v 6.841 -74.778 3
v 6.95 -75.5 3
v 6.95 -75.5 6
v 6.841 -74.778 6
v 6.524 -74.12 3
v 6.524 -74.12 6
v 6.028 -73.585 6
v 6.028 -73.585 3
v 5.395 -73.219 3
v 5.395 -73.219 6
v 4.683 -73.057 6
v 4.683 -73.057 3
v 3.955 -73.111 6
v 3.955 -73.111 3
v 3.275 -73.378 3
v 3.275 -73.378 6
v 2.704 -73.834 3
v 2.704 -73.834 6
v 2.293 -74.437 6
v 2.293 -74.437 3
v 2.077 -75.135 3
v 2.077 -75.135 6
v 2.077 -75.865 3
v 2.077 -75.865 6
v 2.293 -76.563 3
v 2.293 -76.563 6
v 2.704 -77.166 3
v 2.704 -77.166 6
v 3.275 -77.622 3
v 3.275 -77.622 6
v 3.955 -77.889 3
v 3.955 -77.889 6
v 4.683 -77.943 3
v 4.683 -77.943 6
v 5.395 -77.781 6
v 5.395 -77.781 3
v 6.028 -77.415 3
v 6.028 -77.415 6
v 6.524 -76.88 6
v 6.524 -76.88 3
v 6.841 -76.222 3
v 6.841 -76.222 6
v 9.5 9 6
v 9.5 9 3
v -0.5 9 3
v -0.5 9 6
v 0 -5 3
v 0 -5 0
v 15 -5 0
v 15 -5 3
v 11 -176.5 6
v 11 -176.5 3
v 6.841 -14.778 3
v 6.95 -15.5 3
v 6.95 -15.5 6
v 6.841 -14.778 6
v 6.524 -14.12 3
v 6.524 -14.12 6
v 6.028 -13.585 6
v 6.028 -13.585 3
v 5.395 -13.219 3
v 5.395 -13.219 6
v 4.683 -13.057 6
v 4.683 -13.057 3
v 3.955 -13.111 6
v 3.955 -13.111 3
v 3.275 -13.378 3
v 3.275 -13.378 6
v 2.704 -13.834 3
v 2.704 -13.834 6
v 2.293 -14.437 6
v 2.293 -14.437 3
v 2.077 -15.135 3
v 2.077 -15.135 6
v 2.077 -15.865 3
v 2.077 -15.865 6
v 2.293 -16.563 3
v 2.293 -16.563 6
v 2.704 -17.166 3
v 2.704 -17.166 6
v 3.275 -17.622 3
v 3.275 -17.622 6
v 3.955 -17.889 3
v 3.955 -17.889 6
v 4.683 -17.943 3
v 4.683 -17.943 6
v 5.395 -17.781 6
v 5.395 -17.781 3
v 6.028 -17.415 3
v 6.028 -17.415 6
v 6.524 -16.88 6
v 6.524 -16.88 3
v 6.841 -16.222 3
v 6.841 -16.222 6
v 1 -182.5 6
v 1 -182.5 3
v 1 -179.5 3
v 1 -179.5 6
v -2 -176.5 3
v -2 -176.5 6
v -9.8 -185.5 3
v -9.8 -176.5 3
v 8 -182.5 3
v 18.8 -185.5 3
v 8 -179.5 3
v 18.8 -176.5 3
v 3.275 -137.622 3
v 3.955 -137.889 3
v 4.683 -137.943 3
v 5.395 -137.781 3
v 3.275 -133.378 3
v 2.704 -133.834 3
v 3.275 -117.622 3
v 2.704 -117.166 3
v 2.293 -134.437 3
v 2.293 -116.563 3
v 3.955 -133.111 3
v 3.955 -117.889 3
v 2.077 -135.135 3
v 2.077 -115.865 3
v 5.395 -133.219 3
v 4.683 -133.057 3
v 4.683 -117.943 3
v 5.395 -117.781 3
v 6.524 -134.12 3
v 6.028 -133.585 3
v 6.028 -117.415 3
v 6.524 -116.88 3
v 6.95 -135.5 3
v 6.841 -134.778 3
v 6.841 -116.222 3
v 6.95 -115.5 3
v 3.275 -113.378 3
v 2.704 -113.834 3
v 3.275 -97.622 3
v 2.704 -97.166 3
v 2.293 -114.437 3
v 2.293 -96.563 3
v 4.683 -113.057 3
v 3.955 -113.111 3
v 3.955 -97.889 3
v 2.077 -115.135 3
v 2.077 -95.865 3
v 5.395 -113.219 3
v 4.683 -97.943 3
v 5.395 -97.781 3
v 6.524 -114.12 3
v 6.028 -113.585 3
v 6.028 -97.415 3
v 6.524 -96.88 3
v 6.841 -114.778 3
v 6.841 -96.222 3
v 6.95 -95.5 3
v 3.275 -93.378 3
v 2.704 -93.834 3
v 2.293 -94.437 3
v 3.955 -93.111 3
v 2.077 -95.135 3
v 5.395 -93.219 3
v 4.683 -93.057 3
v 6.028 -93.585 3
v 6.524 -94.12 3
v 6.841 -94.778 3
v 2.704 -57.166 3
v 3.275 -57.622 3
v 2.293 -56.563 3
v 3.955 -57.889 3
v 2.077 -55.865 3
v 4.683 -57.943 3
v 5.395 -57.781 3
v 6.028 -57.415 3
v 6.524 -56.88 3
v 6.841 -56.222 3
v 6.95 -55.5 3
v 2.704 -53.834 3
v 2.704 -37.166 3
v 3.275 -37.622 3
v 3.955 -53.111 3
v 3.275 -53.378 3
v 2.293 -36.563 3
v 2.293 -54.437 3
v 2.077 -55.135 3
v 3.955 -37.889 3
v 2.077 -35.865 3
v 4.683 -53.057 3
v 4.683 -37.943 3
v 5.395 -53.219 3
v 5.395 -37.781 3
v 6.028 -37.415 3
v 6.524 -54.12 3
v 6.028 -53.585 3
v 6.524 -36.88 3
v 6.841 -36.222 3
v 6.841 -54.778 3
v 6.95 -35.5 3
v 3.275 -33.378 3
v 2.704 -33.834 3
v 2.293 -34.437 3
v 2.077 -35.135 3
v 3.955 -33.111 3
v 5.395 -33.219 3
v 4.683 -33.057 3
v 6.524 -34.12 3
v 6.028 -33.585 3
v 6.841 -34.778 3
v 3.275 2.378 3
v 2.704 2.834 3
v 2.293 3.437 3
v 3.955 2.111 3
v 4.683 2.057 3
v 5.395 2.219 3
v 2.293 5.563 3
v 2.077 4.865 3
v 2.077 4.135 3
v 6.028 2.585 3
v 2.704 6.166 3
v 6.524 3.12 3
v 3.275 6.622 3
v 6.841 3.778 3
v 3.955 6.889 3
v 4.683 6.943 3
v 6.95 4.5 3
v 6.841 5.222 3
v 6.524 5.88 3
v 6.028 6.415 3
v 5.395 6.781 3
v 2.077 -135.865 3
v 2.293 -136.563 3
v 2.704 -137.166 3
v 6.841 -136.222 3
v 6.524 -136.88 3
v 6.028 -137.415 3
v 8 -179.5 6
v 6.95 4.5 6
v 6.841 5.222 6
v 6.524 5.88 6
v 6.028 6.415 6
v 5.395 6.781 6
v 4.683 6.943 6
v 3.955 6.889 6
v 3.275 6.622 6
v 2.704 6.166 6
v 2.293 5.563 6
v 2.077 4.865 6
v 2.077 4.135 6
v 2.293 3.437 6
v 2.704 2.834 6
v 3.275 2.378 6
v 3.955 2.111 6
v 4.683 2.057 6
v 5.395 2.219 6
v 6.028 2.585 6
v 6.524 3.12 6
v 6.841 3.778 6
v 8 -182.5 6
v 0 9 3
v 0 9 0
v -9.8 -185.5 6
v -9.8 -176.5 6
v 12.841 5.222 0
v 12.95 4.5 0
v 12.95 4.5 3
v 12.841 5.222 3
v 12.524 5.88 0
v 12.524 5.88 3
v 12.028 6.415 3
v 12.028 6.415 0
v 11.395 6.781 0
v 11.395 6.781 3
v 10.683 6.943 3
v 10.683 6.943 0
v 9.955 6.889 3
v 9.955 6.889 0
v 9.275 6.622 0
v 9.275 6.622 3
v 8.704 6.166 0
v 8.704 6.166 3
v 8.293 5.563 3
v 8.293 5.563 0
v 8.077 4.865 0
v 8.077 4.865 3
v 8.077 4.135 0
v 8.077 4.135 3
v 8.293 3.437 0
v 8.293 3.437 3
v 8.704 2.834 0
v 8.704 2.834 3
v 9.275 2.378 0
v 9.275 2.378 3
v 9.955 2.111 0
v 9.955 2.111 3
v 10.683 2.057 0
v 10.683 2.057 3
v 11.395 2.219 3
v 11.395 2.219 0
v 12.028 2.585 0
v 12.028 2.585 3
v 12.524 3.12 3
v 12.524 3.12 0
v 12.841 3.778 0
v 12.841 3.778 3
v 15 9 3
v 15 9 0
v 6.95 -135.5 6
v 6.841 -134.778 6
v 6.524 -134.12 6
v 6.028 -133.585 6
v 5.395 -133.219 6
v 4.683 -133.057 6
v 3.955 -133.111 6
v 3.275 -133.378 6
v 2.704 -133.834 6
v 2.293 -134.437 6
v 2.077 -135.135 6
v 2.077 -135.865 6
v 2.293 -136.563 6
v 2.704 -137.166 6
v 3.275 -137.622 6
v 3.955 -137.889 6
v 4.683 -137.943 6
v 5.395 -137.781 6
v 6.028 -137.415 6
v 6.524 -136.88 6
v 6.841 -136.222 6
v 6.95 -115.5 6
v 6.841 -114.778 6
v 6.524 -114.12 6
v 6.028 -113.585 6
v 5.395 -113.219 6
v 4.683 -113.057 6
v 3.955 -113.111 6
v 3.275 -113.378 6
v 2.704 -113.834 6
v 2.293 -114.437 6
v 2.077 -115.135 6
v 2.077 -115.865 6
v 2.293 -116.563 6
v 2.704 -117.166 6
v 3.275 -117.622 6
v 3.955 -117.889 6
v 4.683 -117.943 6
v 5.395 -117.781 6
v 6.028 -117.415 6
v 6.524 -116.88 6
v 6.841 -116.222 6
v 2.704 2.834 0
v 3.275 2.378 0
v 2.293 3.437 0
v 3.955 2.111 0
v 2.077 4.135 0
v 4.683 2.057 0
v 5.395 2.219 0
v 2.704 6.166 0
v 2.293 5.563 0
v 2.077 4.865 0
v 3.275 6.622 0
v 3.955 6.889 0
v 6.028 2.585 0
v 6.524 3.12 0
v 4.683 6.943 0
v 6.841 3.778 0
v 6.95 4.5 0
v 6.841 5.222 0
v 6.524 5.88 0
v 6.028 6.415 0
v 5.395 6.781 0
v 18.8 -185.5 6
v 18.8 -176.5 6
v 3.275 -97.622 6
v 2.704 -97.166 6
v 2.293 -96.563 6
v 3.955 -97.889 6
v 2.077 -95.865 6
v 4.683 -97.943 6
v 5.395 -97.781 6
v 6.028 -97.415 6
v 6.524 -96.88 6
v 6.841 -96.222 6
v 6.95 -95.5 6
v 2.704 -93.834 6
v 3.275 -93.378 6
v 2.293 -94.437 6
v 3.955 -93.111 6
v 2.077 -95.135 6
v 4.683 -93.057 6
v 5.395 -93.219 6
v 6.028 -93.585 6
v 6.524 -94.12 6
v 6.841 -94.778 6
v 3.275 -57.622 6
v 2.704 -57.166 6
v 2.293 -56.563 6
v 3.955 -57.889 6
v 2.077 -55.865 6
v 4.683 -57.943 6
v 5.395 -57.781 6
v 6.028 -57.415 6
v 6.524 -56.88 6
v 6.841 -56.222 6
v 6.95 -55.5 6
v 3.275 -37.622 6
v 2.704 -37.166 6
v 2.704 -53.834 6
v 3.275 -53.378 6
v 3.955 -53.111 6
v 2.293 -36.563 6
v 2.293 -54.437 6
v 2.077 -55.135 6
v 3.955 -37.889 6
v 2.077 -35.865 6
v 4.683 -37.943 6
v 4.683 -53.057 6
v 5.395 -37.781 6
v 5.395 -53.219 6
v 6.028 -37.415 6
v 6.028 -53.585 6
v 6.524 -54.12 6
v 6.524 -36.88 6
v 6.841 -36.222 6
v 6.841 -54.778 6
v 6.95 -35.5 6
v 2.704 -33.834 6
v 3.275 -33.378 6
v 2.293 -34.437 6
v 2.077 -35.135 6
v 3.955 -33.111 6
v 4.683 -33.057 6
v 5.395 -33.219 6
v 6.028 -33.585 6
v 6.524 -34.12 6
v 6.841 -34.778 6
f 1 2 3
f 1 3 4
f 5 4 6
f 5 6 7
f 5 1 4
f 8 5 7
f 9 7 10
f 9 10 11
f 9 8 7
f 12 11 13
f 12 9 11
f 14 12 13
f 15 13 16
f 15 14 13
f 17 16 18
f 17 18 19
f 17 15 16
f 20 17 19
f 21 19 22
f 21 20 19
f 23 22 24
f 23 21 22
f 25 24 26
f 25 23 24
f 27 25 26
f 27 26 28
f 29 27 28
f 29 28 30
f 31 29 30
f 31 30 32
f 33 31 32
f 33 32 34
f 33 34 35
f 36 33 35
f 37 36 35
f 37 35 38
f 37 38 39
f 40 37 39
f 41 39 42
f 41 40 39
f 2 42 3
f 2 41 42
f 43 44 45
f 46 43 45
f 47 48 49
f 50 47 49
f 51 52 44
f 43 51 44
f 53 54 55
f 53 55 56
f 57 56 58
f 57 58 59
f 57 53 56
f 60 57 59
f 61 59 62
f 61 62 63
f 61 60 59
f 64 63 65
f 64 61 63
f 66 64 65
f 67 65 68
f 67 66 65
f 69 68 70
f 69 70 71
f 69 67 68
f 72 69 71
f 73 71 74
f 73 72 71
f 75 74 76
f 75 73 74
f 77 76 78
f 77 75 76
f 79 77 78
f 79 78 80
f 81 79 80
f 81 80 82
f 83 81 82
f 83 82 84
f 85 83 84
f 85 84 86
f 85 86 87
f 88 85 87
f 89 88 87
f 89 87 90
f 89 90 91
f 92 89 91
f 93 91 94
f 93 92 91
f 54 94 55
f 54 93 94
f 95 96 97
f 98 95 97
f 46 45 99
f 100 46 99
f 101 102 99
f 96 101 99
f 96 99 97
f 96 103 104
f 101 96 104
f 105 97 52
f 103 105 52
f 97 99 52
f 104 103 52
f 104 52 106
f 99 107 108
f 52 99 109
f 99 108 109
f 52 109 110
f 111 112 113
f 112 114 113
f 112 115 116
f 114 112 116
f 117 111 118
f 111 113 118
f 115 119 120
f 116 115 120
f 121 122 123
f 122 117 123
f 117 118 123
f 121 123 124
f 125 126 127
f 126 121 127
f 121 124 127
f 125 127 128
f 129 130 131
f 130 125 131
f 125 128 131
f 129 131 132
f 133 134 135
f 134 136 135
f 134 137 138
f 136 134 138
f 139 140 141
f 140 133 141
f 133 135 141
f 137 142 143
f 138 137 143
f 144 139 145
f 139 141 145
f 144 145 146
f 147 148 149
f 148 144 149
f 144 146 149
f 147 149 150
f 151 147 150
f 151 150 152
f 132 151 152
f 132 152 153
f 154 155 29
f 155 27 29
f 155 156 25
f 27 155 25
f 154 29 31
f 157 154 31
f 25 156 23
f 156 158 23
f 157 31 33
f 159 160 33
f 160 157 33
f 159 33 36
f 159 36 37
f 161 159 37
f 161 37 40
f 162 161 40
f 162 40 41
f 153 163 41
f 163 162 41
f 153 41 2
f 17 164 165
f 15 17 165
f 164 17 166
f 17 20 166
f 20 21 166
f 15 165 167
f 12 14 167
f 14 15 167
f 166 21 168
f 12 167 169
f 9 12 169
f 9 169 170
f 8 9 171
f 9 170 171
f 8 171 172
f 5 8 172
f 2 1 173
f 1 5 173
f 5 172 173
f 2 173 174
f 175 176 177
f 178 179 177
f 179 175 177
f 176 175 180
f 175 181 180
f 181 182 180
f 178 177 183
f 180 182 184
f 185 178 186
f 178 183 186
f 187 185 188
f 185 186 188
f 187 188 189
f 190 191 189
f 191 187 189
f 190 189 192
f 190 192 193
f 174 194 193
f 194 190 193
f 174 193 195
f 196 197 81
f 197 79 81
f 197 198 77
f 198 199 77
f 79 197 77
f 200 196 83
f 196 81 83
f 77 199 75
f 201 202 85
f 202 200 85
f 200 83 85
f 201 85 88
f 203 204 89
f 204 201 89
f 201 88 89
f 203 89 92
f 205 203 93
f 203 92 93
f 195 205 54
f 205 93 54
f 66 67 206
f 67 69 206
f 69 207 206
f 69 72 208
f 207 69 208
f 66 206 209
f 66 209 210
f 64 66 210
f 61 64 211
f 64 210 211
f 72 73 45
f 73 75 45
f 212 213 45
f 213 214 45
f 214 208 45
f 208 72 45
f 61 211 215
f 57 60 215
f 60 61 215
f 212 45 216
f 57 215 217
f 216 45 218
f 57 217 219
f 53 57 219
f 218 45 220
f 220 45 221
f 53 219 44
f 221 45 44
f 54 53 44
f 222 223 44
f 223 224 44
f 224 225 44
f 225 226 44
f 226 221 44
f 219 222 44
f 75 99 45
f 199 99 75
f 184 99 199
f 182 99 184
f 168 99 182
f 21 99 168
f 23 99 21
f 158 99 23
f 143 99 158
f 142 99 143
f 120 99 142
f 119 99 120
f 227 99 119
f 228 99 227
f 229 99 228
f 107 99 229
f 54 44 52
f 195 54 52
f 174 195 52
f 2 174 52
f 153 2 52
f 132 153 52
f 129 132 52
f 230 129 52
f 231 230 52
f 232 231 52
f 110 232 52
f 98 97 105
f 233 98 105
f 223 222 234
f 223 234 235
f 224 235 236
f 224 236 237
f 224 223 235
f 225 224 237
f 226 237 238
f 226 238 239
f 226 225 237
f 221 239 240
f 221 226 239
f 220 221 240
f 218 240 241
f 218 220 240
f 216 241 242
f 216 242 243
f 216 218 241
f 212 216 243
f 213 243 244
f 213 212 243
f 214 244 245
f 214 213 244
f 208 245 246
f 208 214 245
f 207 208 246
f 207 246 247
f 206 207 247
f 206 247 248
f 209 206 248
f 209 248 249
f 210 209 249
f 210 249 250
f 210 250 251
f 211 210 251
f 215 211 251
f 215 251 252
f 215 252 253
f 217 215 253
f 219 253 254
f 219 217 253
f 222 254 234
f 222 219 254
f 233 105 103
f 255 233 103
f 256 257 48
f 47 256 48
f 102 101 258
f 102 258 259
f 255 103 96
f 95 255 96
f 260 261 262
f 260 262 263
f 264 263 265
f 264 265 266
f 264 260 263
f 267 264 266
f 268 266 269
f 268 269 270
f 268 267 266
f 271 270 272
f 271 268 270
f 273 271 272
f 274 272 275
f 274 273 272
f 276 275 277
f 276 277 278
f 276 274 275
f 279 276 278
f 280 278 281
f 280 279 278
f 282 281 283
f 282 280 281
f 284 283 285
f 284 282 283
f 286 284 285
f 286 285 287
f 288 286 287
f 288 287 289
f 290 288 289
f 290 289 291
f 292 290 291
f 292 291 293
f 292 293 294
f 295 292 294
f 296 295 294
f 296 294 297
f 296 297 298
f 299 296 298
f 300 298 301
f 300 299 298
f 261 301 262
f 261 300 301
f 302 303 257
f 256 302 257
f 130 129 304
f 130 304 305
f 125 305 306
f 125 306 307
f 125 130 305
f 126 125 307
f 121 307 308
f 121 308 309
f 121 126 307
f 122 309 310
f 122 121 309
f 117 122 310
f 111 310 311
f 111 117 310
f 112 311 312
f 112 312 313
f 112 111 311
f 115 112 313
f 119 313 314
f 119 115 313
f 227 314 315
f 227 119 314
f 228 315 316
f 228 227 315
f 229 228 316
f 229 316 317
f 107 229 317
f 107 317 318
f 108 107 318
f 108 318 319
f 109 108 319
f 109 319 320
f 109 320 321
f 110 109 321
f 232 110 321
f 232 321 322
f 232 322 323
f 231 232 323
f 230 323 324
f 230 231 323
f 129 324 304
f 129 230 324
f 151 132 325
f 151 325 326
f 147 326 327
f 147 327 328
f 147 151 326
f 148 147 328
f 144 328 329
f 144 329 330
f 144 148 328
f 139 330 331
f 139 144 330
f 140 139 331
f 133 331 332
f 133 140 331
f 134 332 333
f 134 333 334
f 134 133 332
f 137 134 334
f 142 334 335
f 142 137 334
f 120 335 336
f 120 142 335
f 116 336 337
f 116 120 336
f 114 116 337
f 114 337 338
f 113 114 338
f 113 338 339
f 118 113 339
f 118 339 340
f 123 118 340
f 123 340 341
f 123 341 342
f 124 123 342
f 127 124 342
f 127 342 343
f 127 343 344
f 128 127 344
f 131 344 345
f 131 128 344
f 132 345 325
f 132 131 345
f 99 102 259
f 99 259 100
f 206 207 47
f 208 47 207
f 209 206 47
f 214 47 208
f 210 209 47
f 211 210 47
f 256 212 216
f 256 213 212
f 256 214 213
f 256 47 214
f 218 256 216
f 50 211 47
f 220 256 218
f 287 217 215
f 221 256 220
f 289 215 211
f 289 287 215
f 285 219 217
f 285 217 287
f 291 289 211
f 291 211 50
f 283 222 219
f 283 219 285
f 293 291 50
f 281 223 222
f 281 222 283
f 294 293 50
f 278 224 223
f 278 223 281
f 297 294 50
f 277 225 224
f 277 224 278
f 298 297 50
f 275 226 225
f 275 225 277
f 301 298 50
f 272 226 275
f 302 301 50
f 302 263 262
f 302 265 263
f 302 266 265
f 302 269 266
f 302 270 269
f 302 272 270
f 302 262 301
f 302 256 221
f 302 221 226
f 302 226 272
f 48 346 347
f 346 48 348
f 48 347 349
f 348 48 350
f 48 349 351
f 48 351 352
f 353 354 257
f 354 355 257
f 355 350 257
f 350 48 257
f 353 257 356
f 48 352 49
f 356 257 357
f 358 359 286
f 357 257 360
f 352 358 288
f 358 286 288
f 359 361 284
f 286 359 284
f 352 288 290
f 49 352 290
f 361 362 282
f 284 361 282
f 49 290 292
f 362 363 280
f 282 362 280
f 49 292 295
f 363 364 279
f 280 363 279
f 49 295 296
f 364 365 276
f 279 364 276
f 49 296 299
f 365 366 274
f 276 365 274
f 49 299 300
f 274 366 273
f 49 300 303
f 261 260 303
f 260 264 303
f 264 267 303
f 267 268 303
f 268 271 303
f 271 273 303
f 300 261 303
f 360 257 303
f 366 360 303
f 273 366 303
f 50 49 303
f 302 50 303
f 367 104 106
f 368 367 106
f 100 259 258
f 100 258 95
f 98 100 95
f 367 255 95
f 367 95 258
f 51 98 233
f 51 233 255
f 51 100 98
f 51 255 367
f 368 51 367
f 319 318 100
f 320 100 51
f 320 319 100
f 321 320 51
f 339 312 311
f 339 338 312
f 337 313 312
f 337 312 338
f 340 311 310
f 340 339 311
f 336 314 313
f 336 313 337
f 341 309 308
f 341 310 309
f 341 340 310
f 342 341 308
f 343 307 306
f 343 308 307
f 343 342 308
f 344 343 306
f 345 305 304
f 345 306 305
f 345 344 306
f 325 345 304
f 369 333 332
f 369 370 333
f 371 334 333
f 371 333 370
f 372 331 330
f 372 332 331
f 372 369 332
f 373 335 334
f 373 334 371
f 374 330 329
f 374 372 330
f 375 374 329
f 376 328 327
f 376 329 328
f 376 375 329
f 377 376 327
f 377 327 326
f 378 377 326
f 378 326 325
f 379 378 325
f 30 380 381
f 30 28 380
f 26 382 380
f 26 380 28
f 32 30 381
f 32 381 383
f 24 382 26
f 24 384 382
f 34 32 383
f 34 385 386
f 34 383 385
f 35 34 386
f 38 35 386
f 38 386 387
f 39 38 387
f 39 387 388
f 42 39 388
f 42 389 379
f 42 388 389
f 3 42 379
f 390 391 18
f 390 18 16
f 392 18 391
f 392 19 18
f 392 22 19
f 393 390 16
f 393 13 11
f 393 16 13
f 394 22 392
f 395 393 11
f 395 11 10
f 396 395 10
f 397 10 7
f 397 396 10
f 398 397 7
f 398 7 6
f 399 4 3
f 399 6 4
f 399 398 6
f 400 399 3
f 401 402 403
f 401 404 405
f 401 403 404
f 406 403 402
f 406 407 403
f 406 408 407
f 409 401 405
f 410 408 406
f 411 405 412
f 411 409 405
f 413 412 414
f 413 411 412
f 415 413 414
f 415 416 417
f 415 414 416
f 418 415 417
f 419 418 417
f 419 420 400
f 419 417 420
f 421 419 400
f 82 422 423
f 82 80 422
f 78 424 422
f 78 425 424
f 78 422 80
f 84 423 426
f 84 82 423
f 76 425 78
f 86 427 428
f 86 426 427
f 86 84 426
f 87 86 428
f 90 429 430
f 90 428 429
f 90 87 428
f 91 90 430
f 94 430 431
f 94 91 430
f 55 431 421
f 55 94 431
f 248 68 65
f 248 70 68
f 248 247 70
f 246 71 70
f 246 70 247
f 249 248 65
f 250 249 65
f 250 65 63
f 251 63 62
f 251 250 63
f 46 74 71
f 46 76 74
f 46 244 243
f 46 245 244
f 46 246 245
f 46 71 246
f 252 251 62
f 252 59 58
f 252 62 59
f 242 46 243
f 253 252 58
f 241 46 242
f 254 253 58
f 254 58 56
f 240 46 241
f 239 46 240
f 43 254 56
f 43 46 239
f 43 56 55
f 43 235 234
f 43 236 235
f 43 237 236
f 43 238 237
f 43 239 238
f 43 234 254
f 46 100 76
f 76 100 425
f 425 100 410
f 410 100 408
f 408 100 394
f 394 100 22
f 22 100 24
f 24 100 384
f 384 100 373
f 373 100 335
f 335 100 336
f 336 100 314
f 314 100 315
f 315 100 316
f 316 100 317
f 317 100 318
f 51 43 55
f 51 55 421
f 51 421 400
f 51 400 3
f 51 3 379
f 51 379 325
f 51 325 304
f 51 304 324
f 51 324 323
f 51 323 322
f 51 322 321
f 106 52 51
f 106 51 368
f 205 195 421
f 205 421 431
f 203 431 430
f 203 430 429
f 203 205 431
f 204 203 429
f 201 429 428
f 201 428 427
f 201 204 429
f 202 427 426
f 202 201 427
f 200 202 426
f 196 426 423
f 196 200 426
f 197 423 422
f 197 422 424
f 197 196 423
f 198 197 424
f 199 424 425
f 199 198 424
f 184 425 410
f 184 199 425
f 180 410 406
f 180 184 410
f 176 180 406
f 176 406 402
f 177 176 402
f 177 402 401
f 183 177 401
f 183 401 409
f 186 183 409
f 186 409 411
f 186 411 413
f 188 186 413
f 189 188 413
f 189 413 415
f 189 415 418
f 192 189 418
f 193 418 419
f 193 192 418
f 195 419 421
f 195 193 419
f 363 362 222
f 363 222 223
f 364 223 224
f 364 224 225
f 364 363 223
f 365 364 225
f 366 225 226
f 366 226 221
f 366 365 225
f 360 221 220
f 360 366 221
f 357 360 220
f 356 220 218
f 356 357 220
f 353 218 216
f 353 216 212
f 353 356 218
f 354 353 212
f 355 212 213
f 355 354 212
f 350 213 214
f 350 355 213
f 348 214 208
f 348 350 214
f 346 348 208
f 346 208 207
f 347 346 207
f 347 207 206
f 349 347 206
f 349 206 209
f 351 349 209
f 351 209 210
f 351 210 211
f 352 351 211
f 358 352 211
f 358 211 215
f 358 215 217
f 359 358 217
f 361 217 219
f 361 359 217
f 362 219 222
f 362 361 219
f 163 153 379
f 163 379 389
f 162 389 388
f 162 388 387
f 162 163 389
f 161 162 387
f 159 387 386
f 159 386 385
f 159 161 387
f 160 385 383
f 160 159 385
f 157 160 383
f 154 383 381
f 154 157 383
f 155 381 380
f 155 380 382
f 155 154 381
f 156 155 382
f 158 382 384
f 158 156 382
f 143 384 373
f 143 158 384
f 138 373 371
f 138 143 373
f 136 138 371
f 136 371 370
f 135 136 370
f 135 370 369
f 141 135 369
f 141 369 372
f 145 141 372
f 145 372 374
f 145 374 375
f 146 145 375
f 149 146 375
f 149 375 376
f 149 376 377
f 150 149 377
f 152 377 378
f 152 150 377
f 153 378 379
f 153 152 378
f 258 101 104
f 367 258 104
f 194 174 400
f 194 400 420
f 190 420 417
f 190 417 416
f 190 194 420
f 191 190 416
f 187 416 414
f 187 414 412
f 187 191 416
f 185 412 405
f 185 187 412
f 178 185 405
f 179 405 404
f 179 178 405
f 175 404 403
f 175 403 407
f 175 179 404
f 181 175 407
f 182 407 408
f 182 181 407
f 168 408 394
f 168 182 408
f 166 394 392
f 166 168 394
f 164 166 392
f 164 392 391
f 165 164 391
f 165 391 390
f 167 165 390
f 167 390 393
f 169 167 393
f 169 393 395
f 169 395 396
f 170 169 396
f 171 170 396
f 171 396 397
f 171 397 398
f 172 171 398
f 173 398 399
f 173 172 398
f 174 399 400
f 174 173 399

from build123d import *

# Parameters (mm, degrees)
F0_R     = 2.45
F1_DEPTH = 3
F2_R     = 2.45
F2_W     = 7.8
F2_H     = 9
F3_DEPTH = 3


with BuildPart() as f1:
    # F0 (on Top) → F1 (new body)
    with BuildSketch(Plane.XY):
        Polygon((7.5, 0), (0, 0), (0, -5), (15, -5), (15, 0), align=None)
        Polygon((0, 9), (0, 0), (7.5, 0), (15, 0), (15, 9), (7.5, 9), align=None)
        with Locations((4.5, 4.5)):
            Circle(F0_R, mode=Mode.SUBTRACT)
        with Locations((10.5, 4.5)):
            Circle(F0_R, mode=Mode.SUBTRACT)
    extrude(amount=F1_DEPTH)


with BuildPart() as f3:
    # F2 (on face) → F3 (new body)
    with BuildSketch(Plane.XY.offset(3)):
        Polygon((4.5, 9), (0, 9), (-0.5, 9), (-0.5, 0), (0, 0), (4.5, 0), (9, 0), (9.5, 0), (9.5, 9), (9, 9), align=None)
        with Locations((4.5, 4.5)):
            Circle(F2_R, mode=Mode.SUBTRACT)
        Polygon((-0.5, 0), (-0.5, 9), (-2, -176.5), (4.5, -176.5), (11, -176.5), (9.5, 9), (9.5, 0), (9, 0), (4.5, 0), (0, 0), align=None)
        with Locations((4.5, -135.5)):
            Circle(F2_R, mode=Mode.SUBTRACT)
        with Locations((4.5, -115.5)):
            Circle(F2_R, mode=Mode.SUBTRACT)
        with Locations((4.5, -95.5)):
            Circle(F2_R, mode=Mode.SUBTRACT)
        with Locations((4.5, -75.5)):
            Circle(F2_R, mode=Mode.SUBTRACT)
        with Locations((4.5, -55.5)):
            Circle(F2_R, mode=Mode.SUBTRACT)
        with Locations((4.5, -35.5)):
            Circle(F2_R, mode=Mode.SUBTRACT)
        with Locations((4.5, -15.5)):
            Circle(F2_R, mode=Mode.SUBTRACT)
        Polygon((4.5, -176.5), (-2, -176.5), (-2, -185.5), (-0.5, -185.5), (4.5, -185.5), (4.5, -182.5), (1, -182.5), (1, -179.5), (4.5, -179.5), align=None)
        with Locations((-5.9, -181)):
            Rectangle(F2_W, F2_H)
        Polygon((11, -176.5), (4.5, -176.5), (4.5, -179.5), (8, -179.5), (8, -182.5), (4.5, -182.5), (4.5, -185.5), (9.5, -185.5), (11, -185.5), align=None)
        with Locations((14.9, -181)):
            Rectangle(F2_W, F2_H)
    extrude(amount=F3_DEPTH)


solid = Compound([f1.part, f3.part])
